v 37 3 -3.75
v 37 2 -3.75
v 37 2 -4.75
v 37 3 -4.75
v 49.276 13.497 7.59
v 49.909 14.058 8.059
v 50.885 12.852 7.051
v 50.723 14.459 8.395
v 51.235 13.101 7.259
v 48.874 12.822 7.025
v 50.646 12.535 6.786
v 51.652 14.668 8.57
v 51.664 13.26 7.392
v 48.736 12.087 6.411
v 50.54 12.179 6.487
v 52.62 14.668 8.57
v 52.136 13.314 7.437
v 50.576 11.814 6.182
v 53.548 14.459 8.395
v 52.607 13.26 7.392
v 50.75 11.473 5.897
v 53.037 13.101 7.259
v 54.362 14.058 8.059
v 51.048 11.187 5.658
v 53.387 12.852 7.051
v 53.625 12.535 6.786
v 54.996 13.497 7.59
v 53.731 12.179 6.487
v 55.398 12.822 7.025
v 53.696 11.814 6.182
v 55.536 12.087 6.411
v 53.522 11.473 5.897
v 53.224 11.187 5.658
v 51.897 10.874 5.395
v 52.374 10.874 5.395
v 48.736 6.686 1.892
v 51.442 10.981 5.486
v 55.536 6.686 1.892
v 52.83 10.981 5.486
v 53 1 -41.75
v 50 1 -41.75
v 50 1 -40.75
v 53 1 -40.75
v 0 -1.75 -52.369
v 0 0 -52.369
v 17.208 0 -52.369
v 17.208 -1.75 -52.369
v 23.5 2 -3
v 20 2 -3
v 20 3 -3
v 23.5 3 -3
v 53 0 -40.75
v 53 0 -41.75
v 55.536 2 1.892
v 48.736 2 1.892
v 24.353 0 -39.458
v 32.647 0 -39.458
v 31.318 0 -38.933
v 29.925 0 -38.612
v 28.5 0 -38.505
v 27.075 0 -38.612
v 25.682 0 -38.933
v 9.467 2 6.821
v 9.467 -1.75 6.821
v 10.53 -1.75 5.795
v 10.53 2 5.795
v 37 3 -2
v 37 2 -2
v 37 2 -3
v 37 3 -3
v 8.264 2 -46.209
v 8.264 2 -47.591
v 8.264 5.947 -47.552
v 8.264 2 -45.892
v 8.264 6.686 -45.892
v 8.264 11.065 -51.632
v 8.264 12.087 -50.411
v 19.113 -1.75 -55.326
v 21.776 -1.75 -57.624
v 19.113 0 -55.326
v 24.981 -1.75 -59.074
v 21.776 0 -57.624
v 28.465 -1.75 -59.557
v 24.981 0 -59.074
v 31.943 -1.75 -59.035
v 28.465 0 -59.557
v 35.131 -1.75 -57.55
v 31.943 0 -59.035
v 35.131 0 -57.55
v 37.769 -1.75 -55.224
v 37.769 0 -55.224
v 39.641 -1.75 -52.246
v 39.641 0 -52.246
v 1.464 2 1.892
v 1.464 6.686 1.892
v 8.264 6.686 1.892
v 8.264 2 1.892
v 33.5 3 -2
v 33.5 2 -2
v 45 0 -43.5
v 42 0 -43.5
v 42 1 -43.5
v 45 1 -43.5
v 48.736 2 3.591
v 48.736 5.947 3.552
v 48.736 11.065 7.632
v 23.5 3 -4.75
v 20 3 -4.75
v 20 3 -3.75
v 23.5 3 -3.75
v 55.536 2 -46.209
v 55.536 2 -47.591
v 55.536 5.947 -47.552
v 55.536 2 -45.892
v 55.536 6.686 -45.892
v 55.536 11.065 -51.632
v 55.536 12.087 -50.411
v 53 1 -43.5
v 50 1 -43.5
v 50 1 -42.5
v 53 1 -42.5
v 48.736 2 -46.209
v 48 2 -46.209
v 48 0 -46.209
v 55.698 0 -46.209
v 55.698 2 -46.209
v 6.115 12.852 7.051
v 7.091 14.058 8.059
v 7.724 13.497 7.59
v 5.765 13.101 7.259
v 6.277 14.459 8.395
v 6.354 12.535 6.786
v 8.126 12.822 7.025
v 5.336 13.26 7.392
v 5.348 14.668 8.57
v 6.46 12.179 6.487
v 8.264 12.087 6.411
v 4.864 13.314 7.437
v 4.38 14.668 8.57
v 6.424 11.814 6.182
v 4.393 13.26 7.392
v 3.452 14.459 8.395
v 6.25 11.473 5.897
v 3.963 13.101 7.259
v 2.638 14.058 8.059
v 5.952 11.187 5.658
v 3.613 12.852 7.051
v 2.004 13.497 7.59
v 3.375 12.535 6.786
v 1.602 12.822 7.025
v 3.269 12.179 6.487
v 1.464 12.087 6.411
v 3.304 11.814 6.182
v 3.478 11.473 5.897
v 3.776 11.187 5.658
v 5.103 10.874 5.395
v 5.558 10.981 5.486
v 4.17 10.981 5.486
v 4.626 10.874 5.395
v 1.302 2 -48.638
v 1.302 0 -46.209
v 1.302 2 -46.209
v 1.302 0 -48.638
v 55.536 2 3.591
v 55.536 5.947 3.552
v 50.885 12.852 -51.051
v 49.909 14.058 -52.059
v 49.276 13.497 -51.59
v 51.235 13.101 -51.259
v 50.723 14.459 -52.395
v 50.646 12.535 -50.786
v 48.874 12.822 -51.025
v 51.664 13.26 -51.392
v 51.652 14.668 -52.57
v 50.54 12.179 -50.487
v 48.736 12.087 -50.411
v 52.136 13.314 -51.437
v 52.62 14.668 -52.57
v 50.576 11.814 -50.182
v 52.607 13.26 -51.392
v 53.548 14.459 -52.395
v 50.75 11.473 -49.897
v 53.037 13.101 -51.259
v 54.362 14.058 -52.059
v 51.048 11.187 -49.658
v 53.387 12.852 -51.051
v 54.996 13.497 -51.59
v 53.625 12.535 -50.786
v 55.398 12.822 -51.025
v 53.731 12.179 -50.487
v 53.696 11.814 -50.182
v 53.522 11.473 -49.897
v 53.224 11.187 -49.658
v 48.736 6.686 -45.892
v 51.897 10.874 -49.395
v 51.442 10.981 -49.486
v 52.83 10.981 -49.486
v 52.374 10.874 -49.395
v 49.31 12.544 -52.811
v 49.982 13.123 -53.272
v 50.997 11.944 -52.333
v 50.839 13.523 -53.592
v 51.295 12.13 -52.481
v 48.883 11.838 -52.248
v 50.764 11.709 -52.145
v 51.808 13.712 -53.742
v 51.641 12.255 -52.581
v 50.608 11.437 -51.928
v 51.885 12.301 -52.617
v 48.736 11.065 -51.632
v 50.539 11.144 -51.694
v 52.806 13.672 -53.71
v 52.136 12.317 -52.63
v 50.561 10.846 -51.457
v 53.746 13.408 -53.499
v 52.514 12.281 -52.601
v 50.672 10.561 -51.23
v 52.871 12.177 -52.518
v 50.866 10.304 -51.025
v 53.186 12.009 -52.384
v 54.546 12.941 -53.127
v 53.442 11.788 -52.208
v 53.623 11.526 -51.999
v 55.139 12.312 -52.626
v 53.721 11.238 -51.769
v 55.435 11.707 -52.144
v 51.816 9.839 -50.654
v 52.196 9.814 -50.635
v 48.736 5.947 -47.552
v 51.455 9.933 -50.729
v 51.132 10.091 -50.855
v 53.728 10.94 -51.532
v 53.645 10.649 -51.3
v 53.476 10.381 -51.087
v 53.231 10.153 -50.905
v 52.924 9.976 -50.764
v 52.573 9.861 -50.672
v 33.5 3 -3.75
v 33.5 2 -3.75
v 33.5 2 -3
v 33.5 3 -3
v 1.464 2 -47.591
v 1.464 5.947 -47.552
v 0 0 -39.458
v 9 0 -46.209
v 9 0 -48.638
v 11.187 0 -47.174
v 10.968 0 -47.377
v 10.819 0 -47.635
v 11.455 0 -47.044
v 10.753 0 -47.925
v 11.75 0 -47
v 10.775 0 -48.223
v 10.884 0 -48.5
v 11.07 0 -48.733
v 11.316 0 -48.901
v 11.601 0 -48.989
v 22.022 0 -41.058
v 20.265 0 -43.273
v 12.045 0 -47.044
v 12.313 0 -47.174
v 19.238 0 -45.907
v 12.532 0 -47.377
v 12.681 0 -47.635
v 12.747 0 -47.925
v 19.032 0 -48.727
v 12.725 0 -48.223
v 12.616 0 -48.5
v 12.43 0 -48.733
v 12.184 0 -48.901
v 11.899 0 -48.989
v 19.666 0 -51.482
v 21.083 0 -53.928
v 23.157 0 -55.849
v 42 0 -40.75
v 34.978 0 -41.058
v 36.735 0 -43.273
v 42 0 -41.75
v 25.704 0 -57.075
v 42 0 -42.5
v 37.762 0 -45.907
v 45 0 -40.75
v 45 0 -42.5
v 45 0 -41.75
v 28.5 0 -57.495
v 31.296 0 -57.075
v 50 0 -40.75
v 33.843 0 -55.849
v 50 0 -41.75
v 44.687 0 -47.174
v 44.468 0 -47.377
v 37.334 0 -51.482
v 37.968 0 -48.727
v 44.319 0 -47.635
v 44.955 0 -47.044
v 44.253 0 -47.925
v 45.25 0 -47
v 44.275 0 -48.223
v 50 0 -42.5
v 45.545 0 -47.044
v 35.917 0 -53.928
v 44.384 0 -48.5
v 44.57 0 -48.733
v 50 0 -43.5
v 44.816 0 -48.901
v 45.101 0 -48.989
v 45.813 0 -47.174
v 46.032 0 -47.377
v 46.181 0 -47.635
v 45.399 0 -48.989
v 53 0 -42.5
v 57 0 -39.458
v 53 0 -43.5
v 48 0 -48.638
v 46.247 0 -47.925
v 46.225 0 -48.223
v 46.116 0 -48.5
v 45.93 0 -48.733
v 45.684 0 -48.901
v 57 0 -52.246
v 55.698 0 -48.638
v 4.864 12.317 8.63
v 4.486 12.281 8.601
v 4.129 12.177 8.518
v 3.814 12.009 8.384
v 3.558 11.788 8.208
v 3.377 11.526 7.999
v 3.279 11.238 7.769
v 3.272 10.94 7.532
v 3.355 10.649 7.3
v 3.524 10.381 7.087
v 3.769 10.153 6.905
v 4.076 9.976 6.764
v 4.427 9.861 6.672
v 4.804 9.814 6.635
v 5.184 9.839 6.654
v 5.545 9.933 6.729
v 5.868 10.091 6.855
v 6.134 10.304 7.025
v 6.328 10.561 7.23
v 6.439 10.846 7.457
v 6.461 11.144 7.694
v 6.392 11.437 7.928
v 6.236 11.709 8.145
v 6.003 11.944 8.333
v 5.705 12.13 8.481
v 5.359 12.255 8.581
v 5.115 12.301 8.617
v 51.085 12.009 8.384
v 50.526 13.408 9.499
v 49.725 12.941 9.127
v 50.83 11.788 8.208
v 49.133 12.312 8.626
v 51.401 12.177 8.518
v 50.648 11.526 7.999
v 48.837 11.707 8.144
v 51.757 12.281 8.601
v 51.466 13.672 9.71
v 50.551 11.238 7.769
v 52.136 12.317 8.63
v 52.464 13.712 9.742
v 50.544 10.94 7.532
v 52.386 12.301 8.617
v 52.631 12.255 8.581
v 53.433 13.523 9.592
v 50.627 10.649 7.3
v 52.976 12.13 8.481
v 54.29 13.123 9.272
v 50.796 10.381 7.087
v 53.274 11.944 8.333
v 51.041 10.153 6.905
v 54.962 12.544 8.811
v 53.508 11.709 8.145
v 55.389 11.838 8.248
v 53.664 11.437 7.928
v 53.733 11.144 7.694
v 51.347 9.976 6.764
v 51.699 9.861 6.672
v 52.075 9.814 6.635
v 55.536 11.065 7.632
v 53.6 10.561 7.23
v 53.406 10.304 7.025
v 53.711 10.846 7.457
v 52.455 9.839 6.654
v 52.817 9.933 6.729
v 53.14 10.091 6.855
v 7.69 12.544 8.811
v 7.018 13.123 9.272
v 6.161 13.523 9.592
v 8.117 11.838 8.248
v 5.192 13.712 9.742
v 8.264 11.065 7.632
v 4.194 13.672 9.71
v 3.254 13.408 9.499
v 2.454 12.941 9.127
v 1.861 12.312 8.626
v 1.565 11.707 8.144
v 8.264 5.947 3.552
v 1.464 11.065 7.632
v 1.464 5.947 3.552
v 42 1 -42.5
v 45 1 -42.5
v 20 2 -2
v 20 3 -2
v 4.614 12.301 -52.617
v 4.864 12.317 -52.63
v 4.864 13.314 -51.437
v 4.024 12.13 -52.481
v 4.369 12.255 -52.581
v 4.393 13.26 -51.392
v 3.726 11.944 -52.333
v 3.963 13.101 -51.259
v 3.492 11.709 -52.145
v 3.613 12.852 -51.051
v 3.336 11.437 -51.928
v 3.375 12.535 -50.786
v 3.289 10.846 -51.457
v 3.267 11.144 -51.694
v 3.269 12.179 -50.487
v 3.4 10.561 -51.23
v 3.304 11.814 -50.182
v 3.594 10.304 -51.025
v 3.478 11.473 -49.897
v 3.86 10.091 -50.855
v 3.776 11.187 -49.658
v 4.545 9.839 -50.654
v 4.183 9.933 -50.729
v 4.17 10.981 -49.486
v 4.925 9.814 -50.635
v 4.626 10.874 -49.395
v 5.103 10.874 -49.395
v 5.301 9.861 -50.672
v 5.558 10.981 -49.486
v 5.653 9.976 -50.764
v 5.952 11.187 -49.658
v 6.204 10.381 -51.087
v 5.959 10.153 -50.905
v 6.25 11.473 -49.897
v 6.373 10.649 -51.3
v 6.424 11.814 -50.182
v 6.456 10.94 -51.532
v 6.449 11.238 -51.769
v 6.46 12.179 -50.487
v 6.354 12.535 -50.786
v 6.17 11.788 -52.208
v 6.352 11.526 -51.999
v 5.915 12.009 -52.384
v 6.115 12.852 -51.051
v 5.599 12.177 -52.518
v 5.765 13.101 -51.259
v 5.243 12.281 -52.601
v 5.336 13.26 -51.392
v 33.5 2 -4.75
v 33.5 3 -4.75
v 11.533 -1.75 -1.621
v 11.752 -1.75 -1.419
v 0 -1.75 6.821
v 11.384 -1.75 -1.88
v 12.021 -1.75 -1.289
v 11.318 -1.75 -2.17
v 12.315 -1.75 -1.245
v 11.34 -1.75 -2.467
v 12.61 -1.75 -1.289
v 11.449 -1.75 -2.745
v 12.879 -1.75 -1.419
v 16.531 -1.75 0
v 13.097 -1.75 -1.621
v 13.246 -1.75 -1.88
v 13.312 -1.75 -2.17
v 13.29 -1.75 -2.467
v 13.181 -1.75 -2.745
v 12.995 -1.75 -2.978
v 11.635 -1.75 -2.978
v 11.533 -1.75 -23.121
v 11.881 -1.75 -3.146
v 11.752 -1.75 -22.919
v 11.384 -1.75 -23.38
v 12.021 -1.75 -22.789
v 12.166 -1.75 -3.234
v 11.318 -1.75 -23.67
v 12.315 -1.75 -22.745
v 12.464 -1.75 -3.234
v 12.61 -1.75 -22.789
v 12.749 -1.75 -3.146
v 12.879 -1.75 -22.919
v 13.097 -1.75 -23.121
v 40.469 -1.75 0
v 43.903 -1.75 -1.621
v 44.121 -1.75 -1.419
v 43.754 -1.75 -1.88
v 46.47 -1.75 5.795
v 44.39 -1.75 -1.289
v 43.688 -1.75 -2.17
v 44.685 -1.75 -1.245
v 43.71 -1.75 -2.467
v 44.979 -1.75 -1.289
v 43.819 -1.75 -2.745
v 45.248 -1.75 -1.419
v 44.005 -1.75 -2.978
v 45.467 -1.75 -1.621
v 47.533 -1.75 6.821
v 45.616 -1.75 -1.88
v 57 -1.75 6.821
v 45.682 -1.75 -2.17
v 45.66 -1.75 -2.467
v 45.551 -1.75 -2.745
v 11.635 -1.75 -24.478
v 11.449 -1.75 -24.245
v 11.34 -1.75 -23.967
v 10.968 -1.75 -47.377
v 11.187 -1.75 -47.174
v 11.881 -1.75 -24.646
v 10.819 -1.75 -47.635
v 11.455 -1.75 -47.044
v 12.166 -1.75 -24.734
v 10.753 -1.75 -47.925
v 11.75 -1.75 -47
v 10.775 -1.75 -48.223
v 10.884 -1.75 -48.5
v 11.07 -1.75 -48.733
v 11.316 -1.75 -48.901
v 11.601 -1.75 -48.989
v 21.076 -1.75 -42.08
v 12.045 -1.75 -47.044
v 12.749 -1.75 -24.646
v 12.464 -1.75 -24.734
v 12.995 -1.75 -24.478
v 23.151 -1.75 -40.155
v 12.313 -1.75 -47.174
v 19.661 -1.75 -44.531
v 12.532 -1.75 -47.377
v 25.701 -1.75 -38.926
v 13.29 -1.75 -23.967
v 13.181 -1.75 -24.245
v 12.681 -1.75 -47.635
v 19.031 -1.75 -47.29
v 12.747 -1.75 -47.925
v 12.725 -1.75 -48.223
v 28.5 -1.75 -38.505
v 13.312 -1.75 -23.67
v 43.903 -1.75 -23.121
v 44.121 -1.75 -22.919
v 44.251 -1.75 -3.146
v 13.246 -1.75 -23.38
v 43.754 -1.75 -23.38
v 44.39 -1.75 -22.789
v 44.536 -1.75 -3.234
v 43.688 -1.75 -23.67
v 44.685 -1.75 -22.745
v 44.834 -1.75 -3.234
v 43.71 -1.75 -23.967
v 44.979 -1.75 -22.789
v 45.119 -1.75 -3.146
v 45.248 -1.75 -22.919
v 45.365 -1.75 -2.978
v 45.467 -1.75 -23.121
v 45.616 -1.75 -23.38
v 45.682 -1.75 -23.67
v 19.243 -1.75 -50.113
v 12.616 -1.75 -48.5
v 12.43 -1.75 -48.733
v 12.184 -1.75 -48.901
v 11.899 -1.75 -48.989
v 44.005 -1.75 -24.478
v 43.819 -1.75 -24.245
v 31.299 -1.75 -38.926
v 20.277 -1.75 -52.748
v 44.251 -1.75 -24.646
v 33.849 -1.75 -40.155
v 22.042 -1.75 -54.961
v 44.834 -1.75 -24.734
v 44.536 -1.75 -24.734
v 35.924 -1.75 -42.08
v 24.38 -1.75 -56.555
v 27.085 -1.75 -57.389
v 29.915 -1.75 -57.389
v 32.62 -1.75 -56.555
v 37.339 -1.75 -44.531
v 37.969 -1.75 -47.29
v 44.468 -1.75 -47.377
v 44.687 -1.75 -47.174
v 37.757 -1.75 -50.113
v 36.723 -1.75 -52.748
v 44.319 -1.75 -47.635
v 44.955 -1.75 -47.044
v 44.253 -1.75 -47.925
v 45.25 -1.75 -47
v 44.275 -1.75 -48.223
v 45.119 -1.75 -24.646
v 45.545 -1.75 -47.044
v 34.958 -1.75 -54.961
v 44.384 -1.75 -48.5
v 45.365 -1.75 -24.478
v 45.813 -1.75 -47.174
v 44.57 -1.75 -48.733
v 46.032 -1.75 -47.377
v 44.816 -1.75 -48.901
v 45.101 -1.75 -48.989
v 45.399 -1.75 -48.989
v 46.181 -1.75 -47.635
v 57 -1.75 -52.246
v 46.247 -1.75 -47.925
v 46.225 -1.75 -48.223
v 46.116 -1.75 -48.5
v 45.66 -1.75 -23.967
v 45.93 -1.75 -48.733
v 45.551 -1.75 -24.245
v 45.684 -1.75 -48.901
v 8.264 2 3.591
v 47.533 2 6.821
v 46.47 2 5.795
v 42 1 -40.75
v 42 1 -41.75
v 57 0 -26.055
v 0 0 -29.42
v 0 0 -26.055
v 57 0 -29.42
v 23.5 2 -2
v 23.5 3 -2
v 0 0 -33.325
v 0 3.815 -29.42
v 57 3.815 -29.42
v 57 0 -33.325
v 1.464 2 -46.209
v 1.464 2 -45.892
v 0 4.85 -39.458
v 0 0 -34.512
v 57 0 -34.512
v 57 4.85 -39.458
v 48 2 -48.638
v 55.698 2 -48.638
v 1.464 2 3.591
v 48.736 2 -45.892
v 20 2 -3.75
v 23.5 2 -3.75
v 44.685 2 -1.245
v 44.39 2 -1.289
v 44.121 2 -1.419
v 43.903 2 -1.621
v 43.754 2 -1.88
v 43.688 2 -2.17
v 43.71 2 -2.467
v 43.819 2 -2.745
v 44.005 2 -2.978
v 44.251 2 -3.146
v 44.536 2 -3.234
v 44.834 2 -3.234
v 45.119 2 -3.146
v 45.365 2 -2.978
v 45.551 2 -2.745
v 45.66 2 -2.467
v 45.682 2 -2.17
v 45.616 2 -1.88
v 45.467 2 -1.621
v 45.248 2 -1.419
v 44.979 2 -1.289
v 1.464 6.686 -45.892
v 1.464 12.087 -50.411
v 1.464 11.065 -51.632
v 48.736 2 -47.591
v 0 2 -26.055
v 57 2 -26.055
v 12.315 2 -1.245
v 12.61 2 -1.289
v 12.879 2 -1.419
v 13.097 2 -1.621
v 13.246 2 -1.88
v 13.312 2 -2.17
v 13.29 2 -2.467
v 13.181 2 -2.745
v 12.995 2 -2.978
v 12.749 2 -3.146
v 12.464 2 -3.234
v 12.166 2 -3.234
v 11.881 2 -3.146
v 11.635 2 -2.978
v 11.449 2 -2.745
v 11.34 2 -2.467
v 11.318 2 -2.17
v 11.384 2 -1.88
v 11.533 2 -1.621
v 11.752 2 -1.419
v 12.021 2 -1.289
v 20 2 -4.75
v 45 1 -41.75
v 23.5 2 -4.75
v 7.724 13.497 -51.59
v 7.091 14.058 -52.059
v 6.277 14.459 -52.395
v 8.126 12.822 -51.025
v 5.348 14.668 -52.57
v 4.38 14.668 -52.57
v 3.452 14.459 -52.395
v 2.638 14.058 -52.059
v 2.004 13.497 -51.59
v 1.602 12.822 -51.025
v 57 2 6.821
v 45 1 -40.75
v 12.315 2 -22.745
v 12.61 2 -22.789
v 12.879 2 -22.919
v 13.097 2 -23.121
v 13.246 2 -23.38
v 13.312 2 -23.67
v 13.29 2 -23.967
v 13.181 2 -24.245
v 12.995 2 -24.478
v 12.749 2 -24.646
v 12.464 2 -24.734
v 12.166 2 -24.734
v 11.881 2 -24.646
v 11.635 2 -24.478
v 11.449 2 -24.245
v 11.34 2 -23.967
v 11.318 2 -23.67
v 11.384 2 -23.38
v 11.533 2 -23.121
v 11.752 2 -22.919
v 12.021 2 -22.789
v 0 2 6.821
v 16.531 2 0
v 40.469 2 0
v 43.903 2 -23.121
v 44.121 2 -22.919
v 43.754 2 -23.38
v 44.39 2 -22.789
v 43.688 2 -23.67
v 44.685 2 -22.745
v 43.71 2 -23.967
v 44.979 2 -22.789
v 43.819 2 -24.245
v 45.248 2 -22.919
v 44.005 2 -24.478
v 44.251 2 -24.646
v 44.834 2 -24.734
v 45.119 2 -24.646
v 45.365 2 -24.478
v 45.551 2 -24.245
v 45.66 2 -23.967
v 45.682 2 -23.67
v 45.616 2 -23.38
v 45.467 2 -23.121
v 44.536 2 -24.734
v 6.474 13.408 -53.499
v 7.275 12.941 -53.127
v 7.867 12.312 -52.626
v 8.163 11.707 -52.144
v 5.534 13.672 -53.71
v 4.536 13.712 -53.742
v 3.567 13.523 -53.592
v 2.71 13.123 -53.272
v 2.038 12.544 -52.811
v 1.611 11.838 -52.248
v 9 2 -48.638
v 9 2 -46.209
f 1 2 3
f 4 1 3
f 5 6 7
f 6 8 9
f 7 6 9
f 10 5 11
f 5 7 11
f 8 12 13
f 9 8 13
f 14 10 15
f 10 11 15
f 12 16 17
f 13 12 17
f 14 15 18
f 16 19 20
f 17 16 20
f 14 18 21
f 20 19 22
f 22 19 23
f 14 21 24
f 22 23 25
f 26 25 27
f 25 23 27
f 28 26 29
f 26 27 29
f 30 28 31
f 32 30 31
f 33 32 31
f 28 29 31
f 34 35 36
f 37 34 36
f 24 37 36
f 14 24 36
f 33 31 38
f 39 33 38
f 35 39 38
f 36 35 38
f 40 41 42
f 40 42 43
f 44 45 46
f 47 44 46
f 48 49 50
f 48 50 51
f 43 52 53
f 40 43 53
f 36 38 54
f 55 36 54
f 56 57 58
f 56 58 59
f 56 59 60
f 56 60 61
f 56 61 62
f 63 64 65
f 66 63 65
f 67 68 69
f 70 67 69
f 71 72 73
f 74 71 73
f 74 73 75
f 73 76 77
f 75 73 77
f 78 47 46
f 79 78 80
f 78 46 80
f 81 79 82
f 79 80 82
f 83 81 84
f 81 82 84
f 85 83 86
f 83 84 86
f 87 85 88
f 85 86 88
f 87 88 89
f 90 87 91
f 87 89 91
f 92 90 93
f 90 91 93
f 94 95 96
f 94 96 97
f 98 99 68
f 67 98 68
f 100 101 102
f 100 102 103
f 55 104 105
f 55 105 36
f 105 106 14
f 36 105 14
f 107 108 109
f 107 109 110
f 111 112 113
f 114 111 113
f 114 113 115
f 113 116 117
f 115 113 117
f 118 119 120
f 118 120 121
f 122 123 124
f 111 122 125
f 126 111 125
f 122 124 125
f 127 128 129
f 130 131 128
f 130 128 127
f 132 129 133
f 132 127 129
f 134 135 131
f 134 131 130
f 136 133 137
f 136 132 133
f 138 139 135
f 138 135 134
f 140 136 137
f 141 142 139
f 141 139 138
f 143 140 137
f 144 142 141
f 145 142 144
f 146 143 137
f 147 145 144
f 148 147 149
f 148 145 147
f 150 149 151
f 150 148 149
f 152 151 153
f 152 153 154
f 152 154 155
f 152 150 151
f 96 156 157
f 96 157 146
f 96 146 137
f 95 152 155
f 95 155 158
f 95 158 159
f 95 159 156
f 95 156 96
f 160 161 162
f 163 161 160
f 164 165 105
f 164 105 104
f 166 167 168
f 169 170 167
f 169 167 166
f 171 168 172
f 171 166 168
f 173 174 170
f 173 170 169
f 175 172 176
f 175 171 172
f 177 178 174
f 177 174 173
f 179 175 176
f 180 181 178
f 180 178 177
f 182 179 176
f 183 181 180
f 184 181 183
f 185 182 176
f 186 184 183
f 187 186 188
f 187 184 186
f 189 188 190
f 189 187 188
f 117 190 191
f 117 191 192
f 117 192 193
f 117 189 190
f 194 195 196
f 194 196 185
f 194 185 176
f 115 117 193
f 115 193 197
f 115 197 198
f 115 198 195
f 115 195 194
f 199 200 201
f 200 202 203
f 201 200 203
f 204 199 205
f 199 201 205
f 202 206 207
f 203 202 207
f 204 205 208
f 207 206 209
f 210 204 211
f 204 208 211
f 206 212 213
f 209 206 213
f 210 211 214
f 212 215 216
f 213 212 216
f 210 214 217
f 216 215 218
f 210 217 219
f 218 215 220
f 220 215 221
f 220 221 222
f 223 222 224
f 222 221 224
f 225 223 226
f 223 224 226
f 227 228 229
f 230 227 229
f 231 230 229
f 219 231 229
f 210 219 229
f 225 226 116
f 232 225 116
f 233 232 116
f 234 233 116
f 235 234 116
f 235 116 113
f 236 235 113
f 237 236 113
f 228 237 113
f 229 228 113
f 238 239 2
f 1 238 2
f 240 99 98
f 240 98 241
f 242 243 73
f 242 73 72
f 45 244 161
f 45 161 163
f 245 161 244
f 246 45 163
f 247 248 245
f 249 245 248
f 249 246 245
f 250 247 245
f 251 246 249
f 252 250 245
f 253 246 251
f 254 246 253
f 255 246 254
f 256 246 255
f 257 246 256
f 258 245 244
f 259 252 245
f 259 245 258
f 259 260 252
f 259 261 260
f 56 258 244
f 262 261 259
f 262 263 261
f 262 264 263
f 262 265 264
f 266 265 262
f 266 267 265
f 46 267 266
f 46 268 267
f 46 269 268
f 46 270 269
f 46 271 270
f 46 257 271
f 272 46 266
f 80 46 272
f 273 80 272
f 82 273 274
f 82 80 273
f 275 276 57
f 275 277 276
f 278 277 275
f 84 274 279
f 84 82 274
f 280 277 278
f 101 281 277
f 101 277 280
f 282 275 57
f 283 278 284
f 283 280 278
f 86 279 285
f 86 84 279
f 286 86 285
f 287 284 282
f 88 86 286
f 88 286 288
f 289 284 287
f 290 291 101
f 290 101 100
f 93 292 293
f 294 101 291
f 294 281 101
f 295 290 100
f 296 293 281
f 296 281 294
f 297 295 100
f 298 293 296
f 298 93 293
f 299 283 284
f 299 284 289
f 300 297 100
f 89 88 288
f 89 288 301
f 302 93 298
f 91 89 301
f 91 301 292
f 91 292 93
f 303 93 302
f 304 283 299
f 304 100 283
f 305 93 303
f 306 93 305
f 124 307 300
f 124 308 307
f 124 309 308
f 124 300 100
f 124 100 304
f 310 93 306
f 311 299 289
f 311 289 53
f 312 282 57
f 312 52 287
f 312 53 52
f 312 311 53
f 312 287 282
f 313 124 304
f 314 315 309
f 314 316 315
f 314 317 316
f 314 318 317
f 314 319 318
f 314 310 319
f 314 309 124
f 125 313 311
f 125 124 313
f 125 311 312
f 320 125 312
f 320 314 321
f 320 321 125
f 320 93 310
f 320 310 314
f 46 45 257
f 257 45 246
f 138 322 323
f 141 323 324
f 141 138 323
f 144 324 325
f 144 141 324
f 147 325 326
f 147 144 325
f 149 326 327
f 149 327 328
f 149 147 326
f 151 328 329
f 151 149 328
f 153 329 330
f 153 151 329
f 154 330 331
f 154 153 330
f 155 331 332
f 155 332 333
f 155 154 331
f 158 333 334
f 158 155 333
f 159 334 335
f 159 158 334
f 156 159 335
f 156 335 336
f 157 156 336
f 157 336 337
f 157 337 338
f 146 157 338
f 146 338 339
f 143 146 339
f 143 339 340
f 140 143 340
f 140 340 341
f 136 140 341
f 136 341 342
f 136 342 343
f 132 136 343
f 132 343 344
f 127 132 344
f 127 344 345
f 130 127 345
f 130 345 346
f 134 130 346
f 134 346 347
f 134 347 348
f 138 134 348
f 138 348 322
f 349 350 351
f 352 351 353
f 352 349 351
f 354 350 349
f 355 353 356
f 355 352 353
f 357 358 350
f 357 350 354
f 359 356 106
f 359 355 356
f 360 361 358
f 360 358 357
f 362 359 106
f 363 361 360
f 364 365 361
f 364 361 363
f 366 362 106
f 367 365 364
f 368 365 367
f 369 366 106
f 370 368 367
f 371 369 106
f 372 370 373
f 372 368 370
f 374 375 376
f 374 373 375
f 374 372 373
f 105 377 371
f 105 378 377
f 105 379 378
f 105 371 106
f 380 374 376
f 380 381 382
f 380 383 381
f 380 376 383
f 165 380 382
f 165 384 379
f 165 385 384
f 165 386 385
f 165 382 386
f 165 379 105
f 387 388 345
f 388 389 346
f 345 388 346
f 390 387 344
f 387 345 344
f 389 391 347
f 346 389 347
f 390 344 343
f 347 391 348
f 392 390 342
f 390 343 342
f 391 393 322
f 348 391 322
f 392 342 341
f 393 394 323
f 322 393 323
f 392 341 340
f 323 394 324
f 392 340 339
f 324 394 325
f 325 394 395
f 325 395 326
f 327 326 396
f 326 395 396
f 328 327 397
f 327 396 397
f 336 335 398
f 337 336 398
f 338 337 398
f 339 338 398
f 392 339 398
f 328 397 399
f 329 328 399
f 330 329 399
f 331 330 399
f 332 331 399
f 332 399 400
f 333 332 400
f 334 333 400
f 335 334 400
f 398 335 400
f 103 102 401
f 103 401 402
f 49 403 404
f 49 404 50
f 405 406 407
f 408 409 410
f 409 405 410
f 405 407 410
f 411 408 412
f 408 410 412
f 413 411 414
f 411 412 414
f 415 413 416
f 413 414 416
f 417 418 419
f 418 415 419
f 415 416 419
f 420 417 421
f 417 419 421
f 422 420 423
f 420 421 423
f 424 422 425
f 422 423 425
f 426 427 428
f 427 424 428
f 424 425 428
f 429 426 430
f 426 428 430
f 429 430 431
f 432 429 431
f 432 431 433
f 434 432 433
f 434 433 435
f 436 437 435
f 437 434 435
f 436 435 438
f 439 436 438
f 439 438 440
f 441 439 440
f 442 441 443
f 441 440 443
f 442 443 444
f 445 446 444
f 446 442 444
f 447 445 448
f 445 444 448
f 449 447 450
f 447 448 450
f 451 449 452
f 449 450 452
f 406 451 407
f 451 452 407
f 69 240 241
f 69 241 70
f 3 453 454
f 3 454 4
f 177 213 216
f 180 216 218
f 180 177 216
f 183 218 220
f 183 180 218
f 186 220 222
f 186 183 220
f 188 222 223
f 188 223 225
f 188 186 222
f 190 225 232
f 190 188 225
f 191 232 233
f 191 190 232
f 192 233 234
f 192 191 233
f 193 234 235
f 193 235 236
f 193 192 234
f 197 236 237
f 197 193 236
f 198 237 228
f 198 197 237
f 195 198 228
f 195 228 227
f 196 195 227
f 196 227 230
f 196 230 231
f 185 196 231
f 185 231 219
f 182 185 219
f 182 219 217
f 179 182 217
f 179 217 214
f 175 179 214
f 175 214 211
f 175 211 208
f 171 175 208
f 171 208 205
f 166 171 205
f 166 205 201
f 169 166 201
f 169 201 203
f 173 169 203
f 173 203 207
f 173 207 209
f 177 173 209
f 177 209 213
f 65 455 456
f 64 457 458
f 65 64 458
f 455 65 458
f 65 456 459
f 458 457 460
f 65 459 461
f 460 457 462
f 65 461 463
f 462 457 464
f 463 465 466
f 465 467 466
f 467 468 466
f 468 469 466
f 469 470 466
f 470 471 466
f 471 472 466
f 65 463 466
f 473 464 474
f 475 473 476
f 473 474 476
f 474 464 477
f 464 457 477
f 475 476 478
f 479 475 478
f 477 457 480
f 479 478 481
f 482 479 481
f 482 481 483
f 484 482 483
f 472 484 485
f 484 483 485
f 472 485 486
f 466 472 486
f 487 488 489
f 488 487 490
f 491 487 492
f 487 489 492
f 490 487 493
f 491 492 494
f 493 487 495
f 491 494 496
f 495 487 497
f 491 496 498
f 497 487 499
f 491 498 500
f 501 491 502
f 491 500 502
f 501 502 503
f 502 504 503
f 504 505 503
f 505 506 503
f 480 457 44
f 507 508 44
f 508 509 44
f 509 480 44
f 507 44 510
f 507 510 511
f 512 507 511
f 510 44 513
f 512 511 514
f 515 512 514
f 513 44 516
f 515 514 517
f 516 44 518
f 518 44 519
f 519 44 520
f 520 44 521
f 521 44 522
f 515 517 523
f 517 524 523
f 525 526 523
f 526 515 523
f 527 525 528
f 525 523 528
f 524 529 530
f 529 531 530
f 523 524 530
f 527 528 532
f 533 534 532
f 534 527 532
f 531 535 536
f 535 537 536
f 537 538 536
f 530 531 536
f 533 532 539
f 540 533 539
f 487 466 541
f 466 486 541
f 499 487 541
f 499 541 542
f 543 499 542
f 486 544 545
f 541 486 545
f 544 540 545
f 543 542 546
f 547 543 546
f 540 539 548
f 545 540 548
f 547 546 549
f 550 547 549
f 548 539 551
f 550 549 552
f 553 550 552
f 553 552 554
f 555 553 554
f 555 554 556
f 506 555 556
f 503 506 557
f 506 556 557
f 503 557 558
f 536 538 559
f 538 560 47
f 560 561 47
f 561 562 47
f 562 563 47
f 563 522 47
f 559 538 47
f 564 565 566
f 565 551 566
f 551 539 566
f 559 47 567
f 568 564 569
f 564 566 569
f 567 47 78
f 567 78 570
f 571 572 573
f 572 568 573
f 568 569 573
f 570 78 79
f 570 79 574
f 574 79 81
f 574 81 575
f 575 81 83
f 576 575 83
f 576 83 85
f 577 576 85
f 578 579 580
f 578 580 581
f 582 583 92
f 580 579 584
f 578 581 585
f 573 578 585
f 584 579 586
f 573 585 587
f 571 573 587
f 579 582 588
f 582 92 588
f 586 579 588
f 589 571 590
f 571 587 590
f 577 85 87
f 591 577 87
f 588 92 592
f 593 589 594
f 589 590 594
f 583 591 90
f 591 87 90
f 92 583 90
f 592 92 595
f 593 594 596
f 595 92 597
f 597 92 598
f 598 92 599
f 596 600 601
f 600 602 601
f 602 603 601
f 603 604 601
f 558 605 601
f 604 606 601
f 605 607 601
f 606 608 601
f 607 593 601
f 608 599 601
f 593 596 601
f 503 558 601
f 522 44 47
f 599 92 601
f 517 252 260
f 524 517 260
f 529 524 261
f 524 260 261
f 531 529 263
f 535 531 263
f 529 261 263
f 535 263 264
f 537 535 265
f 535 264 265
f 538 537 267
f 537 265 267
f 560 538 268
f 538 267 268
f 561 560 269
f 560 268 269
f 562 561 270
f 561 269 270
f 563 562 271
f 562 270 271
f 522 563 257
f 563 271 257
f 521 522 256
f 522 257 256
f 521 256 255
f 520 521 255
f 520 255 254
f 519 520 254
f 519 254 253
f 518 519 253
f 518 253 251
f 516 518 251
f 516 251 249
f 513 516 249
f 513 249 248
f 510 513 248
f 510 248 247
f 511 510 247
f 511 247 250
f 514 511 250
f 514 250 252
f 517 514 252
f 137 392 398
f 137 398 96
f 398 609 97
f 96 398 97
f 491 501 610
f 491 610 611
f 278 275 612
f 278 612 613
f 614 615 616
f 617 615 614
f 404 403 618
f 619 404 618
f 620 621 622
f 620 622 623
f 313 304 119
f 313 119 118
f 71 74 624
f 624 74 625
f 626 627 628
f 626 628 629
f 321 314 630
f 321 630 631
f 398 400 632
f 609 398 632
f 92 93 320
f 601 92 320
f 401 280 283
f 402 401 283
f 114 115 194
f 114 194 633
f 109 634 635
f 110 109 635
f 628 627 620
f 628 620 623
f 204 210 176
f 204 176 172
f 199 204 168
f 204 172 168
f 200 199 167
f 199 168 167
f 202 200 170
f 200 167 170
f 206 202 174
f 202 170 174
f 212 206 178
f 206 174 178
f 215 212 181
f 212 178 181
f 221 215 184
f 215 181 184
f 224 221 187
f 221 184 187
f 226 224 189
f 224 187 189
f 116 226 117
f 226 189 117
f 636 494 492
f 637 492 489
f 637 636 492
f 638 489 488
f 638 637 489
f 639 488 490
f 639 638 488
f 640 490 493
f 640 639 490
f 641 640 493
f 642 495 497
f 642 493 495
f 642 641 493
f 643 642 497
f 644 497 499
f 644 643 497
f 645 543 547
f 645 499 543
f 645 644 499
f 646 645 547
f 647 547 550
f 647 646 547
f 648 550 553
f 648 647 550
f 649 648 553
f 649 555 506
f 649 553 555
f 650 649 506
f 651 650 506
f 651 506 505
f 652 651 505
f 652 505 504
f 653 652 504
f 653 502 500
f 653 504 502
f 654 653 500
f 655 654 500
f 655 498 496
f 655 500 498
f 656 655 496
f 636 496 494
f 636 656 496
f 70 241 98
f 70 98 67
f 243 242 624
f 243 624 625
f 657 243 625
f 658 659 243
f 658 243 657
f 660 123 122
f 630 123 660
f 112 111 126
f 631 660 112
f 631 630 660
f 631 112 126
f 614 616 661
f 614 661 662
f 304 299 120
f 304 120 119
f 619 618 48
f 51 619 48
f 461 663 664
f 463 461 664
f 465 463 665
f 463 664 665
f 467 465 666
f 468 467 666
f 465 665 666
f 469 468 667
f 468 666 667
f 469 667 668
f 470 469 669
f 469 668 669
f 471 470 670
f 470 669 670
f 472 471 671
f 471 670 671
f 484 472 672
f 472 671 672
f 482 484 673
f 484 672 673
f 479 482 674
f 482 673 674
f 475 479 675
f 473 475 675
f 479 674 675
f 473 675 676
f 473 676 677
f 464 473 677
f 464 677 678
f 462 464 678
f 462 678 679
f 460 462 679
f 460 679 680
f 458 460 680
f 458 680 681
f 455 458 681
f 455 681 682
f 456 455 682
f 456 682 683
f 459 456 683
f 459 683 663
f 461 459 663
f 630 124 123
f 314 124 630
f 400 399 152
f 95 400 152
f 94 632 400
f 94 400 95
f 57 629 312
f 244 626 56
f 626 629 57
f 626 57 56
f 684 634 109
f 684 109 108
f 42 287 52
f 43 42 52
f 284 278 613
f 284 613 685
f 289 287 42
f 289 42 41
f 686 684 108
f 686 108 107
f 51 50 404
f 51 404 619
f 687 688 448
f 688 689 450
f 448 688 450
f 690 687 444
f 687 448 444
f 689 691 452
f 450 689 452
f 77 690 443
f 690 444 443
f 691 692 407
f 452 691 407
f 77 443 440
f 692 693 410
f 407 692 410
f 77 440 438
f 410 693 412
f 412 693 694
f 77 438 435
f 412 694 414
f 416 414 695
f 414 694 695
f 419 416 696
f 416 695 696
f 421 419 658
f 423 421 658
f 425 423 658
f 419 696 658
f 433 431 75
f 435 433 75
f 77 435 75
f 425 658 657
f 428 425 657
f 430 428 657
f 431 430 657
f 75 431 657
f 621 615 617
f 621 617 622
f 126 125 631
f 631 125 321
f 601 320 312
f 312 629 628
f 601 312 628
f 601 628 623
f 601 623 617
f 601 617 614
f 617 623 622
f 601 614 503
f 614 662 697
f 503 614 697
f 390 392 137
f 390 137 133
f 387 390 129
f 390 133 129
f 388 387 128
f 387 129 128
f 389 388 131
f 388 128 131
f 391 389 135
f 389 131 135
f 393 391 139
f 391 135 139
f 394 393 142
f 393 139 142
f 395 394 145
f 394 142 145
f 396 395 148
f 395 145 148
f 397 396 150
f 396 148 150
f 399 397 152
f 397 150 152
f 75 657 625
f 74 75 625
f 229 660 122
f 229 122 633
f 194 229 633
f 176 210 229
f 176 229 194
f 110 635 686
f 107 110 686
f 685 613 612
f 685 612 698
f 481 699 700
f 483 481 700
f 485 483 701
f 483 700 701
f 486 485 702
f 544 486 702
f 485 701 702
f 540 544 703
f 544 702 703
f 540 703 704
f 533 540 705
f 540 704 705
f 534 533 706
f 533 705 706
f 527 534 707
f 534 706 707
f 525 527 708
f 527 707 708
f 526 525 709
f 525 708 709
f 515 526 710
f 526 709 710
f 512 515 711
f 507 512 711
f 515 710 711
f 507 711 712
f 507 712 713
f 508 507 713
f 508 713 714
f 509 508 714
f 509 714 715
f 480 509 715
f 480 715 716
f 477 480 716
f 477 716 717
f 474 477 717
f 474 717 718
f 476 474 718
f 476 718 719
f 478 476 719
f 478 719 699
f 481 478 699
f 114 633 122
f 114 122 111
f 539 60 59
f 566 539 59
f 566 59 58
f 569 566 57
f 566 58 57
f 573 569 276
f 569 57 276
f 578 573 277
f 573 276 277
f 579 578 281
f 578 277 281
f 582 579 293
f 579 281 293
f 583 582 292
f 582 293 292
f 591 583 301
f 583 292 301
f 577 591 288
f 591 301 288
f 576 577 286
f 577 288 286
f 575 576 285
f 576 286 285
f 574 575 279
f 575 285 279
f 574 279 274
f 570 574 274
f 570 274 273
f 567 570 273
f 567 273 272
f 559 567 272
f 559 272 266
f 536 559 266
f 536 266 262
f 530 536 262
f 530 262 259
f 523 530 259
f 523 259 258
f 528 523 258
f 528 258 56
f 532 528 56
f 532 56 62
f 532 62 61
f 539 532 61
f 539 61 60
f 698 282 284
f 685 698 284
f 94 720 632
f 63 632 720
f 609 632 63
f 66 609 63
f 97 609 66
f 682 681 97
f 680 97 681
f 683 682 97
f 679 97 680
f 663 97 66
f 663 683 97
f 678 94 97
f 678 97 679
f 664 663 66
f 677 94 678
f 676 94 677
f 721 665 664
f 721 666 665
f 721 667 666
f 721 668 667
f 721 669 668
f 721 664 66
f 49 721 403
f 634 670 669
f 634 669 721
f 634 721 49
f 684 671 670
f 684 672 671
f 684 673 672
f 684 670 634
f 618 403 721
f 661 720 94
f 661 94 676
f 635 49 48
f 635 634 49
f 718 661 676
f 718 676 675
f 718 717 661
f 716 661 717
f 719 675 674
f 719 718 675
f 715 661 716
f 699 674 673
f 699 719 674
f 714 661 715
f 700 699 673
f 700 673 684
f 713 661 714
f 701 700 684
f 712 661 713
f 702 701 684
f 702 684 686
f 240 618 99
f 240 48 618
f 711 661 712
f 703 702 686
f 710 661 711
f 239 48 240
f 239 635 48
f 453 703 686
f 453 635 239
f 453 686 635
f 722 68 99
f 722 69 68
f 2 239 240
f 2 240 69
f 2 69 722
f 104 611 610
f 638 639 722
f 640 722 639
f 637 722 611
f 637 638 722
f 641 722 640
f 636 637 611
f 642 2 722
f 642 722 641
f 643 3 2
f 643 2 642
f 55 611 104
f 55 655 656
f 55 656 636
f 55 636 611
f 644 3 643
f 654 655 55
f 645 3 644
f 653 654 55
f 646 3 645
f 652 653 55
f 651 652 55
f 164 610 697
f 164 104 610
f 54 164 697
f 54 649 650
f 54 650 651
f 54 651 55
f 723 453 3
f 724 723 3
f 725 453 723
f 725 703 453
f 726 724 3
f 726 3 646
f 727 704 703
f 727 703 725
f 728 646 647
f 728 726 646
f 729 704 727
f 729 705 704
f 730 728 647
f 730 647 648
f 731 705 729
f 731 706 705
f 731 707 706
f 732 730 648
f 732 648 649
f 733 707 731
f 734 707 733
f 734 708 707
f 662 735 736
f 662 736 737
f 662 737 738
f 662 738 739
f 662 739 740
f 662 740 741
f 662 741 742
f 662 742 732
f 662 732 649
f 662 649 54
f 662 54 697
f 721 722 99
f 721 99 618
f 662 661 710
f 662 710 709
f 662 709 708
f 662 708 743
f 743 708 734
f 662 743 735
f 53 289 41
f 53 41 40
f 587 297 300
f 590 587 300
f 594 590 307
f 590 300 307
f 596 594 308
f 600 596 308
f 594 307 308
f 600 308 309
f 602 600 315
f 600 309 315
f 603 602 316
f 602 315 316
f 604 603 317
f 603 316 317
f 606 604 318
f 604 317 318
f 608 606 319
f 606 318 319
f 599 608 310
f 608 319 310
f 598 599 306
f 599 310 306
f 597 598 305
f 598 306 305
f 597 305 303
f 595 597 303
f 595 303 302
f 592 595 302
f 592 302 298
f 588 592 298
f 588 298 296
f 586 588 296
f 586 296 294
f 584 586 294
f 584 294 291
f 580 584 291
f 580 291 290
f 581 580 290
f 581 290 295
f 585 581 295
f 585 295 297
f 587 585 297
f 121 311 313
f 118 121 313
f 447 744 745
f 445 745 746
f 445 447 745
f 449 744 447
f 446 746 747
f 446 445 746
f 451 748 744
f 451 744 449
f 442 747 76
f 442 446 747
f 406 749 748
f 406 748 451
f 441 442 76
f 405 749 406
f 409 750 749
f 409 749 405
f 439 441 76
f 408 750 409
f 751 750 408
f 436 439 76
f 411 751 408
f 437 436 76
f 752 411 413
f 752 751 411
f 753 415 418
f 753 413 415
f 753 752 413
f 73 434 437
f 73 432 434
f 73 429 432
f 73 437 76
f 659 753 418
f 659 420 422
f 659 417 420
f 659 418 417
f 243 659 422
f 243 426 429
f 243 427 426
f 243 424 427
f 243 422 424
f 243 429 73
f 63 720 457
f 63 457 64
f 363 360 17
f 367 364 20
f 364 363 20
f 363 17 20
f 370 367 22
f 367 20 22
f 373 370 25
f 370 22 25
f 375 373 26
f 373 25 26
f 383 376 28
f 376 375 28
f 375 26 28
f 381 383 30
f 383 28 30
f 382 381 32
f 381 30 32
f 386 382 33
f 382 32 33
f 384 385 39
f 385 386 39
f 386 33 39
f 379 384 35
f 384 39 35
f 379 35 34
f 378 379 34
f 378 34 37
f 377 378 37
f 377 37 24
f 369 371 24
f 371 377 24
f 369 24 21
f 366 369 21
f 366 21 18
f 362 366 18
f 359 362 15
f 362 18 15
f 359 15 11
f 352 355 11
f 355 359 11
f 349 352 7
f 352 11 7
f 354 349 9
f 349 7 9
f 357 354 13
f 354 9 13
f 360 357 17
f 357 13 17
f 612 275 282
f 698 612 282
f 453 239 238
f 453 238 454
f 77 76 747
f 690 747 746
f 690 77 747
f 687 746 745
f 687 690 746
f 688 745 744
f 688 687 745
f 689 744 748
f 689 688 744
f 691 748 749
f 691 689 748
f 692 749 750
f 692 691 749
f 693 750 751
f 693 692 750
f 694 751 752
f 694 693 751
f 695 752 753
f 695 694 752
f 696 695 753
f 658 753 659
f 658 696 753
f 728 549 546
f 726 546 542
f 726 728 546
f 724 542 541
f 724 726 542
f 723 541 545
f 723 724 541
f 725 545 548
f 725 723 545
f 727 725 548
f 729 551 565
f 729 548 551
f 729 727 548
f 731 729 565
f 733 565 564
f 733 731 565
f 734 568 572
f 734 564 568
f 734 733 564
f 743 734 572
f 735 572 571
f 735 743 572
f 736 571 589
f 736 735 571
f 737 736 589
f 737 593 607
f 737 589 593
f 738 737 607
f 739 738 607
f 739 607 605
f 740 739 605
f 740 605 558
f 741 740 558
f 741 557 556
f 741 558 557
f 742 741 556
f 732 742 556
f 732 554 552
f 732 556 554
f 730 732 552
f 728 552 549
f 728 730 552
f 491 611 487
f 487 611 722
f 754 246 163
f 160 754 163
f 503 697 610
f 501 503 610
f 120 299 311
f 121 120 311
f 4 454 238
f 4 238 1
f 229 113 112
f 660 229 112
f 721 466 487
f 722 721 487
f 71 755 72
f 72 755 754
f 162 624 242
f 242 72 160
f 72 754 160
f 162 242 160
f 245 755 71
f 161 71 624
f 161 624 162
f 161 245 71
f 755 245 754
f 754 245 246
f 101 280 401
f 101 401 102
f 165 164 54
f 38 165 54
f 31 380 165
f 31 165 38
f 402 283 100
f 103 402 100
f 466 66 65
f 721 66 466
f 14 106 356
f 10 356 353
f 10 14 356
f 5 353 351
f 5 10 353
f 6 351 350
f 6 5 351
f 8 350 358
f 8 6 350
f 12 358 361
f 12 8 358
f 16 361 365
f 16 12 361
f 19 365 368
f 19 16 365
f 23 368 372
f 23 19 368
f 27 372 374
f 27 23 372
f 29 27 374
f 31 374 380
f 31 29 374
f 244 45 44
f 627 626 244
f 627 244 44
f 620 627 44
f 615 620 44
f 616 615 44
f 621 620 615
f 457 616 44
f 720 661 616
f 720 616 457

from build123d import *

# Parameters (mm, degrees)
SKIZZE1_W                        = 57
SKIZZE1_H                        = 60
AUFSATZ_LINEAR_AUSTRAGEN1_DEPTH  = 1.75
SKIZZE3_R                        = 9.495370676
SCHNITT_LINEAR_AUSTRAGEN1_DEPTH  = 2
SKIZZE4_W                        = 57
SKIZZE4_H                        = 26.054547174
AUFSATZ_LINEAR_AUSTRAGEN2_DEPTH  = 2
SKIZZE5_R                        = 1
SCHNITT_LINEAR_AUSTRAGEN2_DEPTH  = 4
AUFSATZ_LINEAR_AUSTRAGEN3_DEPTH  = 57
SKIZZE10_R                       = 1
SCHNITT_LINEAR_AUSTRAGEN3_DEPTH  = 2
AUFSATZ_LINEAR_AUSTRAGEN4_DEPTH  = 57
SKIZZE13_W                       = 3
SKIZZE13_H                       = 1
AUFSATZ_LINEAR_AUSTRAGEN6_DEPTH  = 1
SKIZZE16_W                       = 3.5
SKIZZE16_H                       = 1
AUFSATZ_LINEAR_AUSTRAGEN9_DEPTH  = 1
AUFSATZ_LINEAR_AUSTRAGEN11_DEPTH = 3.75
SKIZZE25_W                       = 6.8
SKIZZE25_H                       = 4.678014598
AUFSATZ_LINEAR_AUSTRAGEN12_DEPTH = 13
SKIZZE26_W                       = 6.272143652
SKIZZE26_H                       = 7.131924913
AUFSATZ_LINEAR_AUSTRAGEN13_DEPTH = 6.8
SCHNITT_LINEAR_AUSTRAGEN5_DEPTH  = 6.8
SCHNITT_LINEAR_AUSTRAGEN6_DEPTH  = 6.8
SCHNITT_LINEAR_AUSTRAGEN8_DEPTH  = 3.8
SKIZZE30_R                       = 1.6
SCHNITT_LINEAR_AUSTRAGEN9_DEPTH  = 3.8
SKIZZE31_W                       = 7.69751232
SKIZZE31_H                       = 2.429513609
AUFSATZ_LINEAR_AUSTRAGEN15_DEPTH = 2
SPIEGELN9_COPY_1_SKETCH_W        = 6.8
SPIEGELN9_COPY_1_SKETCH_H        = 4.678014598
SPIEGELN9_COPY_1_DEPTH           = 13
SPIEGELN9_COPY_2_SKETCH_W        = 6.272143652
SPIEGELN9_COPY_2_SKETCH_H        = 7.131924913
SPIEGELN9_COPY_2_DEPTH           = 6.8
SPIEGELN9_COPY_3_DEPTH           = 6.8
SPIEGELN9_COPY_4_DEPTH           = 6.8
SPIEGELN9_COPY_5_DEPTH           = 3.8
SPIEGELN9_COPY_6_SKETCH_R        = 1.6
SPIEGELN9_COPY_6_DEPTH           = 3.8
SCHNITT_LINEAR_AUSTRAGEN10_DEPTH = 10
SCHNITT_LINEAR_AUSTRAGEN11_DEPTH = 10


with BuildPart() as part:
    # Skizze1 → Aufsatz-Linear austragen1 (new body)
    with BuildSketch(Plane(origin=(0, 0, 0), x_dir=(1, 0, 0), z_dir=(0, 1, 0))):
        with Locations((28.5, 30)):
            Rectangle(SKIZZE1_W, SKIZZE1_H)
    extrude(amount=-AUFSATZ_LINEAR_AUSTRAGEN1_DEPTH)

    # Skizze3 → Schnitt-Linear austragen1 (cut)
    with BuildSketch(Plane(origin=(0, 0, 0), x_dir=(1, 0, 0), z_dir=(0, 1, 0))):
        with Locations(Location((28.5, 48, 0), (0, 0, 270))):
            Circle(SKIZZE3_R)
    extrude(amount=-SCHNITT_LINEAR_AUSTRAGEN1_DEPTH, mode=Mode.SUBTRACT)

    # Skizze4 → Aufsatz-Linear austragen2 (add)
    with BuildSketch(Plane(origin=(0, 0, 0), x_dir=(1, 0, 0), z_dir=(0, 1, 0))):
        with Locations((28.5, 13.027273587)):
            Rectangle(SKIZZE4_W, SKIZZE4_H)
    extrude(amount=AUFSATZ_LINEAR_AUSTRAGEN2_DEPTH)

    # Skizze5 → Schnitt-Linear austragen2 (cut)
    with BuildSketch(Plane(origin=(0, 2, 0), x_dir=(1, 0, 0), z_dir=(0, 1, 0))):
        with Locations(Location((12.315263515, 23.744868689, 0), (0, 0, 270))):
            Circle(SKIZZE5_R)
        with Locations(Location((12.315263515, 2.244868689, 0), (0, 0, 270))):
            Circle(SKIZZE5_R)
    schnitt_linear_austragen2 = extrude(amount=-SCHNITT_LINEAR_AUSTRAGEN2_DEPTH, mode=Mode.SUBTRACT)

    # Spiegeln1: Schnitt-Linear austragen2 across plane
    add(schnitt_linear_austragen2.mirror(Plane.ZY.offset(-28.5)), mode=Mode.SUBTRACT)

    # Skizze8 → Aufsatz-Linear austragen3 (add)
    with BuildSketch(Plane.ZY):
        Polygon((-29.419890543, 3.815337259), (-33.325270164, 0), (-29.419890543, 0), align=None)
    extrude(amount=-AUFSATZ_LINEAR_AUSTRAGEN3_DEPTH)

    # Skizze10 → Schnitt-Linear austragen3 (cut)
    with BuildSketch(Plane(origin=(0, 0, 0), x_dir=(1, 0, 0), z_dir=(0, 1, 0))):
        with Locations(Location((45.25, 48, 0), (0, 0, 270))):
            Circle(SKIZZE10_R)
        with Locations(Location((11.75, 48, 0), (0, 0, 270))):
            Circle(SKIZZE10_R)
    extrude(amount=-SCHNITT_LINEAR_AUSTRAGEN3_DEPTH, mode=Mode.SUBTRACT)

    # Skizze11 → Aufsatz-Linear austragen4 (add)
    with BuildSketch(Plane.ZY):
        Polygon((-39.458282478, 4.85029471), (-39.458282478, 0), (-34.51169532, 0), align=None)
    extrude(amount=-AUFSATZ_LINEAR_AUSTRAGEN4_DEPTH)

    # Skizze13 → Aufsatz-Linear austragen6 (add)
    with BuildSketch(Plane(origin=(0, 0, 0), x_dir=(1, 0, 0), z_dir=(0, 1, 0))):
        with Locations((51.5, 43)):
            Rectangle(SKIZZE13_W, SKIZZE13_H)
        with Locations((43.5, 43)):
            Rectangle(SKIZZE13_W, SKIZZE13_H)
        with Locations((51.5, 41.25)):
            Rectangle(SKIZZE13_W, SKIZZE13_H)
        with Locations((43.5, 41.25)):
            Rectangle(SKIZZE13_W, SKIZZE13_H)
    extrude(amount=AUFSATZ_LINEAR_AUSTRAGEN6_DEPTH)

    # Skizze16 → Aufsatz-Linear austragen9 (add)
    with BuildSketch(Plane(origin=(0, 2, 0), x_dir=(1, 0, 0), z_dir=(0, 1, 0))):
        with Locations((21.75, 2.5)):
            Rectangle(SKIZZE16_W, SKIZZE16_H)
        with Locations((35.25, 2.5)):
            Rectangle(SKIZZE16_W, SKIZZE16_H)
        with Locations((21.75, 4.25)):
            Rectangle(SKIZZE16_W, SKIZZE16_H)
        with Locations((35.25, 4.25)):
            Rectangle(SKIZZE16_W, SKIZZE16_H)
    extrude(amount=AUFSATZ_LINEAR_AUSTRAGEN9_DEPTH)

    # Skizze24 → Aufsatz-Linear austragen11 (add)
    with BuildSketch(Plane(origin=(0, 2, 0), x_dir=(1, 0, 0), z_dir=(0, 1, 0))):
        Polygon((57, 0), (57, -15.963189927), (46.470395694, -5.79521838), (40.469065327, 0), align=None)
    aufsatz_linear_austragen11 = extrude(amount=-AUFSATZ_LINEAR_AUSTRAGEN11_DEPTH)

    # Spiegeln2: Aufsatz-Linear austragen11 across plane
    add(aufsatz_linear_austragen11.mirror(Plane.ZY.offset(-28.5)))

    # Skizze25 → Aufsatz-Linear austragen12 (add)
    with BuildSketch(Plane(origin=(0, 2, 0), x_dir=(1, 0, 0), z_dir=(0, 1, 0))):
        with Locations((52.135864274, -3.62433538)):
            Rectangle(SKIZZE25_W, SKIZZE25_H)
    aufsatz_linear_austragen12 = extrude(amount=AUFSATZ_LINEAR_AUSTRAGEN12_DEPTH)

    # Skizze26 → Aufsatz-Linear austragen13 (add)
    with BuildSketch(Plane(origin=(55.535864274, 0, 0), x_dir=(0, 0, -1), z_dir=(1, 0, 0))):
        with Locations((-9.099414505, 11.434037544)):
            Rectangle(SKIZZE26_W, SKIZZE26_H)
    aufsatz_linear_austragen13 = extrude(amount=-AUFSATZ_LINEAR_AUSTRAGEN13_DEPTH)

    # Skizze27 → Schnitt-Linear austragen5 (cut)
    with BuildSketch(Plane(origin=(55.535864274, 0, 0), x_dir=(0, 0, -1), z_dir=(1, 0, 0))):
        Polygon((-10.768511785, 15), (-3.552210741, 5.947030188), (-3.590728104, 2), (-6.081048451, 2), (-5.963342679, 7.868075087), (-12.235486331, 7.868075087), (-12.235486331, 15), align=None)
    schnitt_linear_austragen5 = extrude(amount=-SCHNITT_LINEAR_AUSTRAGEN5_DEPTH, mode=Mode.SUBTRACT)

    # Skizze28 → Schnitt-Linear austragen6 (cut)
    with BuildSketch(Plane(origin=(55.535864274, 0, 0), x_dir=(0, 0, -1), z_dir=(1, 0, 0))):
        Polygon((-9.855196272, 13.854230483), (-8.675818052, 14.794336156), (-1.891775147, 6.686320141), (-1.891775147, 2), (-1.241465065, 2), (-1.241465065, 15.430103774), (-11.112831421, 15.430103774), align=None)
    schnitt_linear_austragen6 = extrude(amount=-SCHNITT_LINEAR_AUSTRAGEN6_DEPTH, mode=Mode.SUBTRACT)

    # Skizze29 → Schnitt-Linear austragen8 (cut)
    with BuildSketch(Plane(origin=(0, 1.822324688, -2.177969385), x_dir=(-1, 0, 0), z_dir=(0, 0.6417106486161895, -0.7669468322201934))):
        with BuildLine():
            Line((-55.535864274, 13.383825147), (-55.535864274, 17.083825147))
            Line((-55.535864274, 17.083825147), (-48.735864274, 17.083825147))
            Line((-48.735864274, 17.083825147), (-48.735864274, 13.383825147))
            ThreePointArc((-48.735864274, 13.383825147), (-52.135864274, 16.783825147), (-55.535864274, 13.383825147))
        make_face()
    schnitt_linear_austragen8 = extrude(amount=-SCHNITT_LINEAR_AUSTRAGEN8_DEPTH, mode=Mode.SUBTRACT)

    # Skizze30 → Schnitt-Linear austragen9 (cut)
    with BuildSketch(Plane(origin=(0, 1.822324688, -2.177969385), x_dir=(-1, 0, 0), z_dir=(0, 0.6417106486161896, -0.7669468322201933))):
        with Locations(Location((-52.135864274, 13.383825147, 0), (0, 0, 90))):
            Circle(SKIZZE30_R)
    schnitt_linear_austragen9 = extrude(amount=-SCHNITT_LINEAR_AUSTRAGEN9_DEPTH, mode=Mode.SUBTRACT)

    # Spiegeln6: Aufsatz-Linear austragen12, Aufsatz-Linear austragen13, Schnitt-Linear austragen5, Schnitt-Linear austragen6, Schnitt-Linear austragen8, Schnitt-Linear austragen9 across plane
    add(aufsatz_linear_austragen12.mirror(Plane.ZY.offset(-28.5)))
    add(aufsatz_linear_austragen13.mirror(Plane.ZY.offset(-28.5)))
    add(schnitt_linear_austragen5.mirror(Plane.ZY.offset(-28.5)), mode=Mode.SUBTRACT)
    add(schnitt_linear_austragen6.mirror(Plane.ZY.offset(-28.5)), mode=Mode.SUBTRACT)
    add(schnitt_linear_austragen8.mirror(Plane.ZY.offset(-28.5)), mode=Mode.SUBTRACT)
    add(schnitt_linear_austragen9.mirror(Plane.ZY.offset(-28.5)), mode=Mode.SUBTRACT)

    # Skizze31 → Aufsatz-Linear austragen15 (add)
    with BuildSketch(Plane(origin=(0, 0, 0), x_dir=(1, 0, 0), z_dir=(0, 1, 0))):
        with Locations((51.84875616, 47.423389314)):
            Rectangle(SKIZZE31_W, SKIZZE31_H)
    aufsatz_linear_austragen15 = extrude(amount=AUFSATZ_LINEAR_AUSTRAGEN15_DEPTH)

    # Spiegeln8: Aufsatz-Linear austragen12, Aufsatz-Linear austragen13, Schnitt-Linear austragen5, Schnitt-Linear austragen6, Schnitt-Linear austragen8, Schnitt-Linear austragen9 across plane
    add(aufsatz_linear_austragen12.mirror(Plane(origin=(0, 0, -22), x_dir=(1, 0, 0), z_dir=(0, 0, -1))))
    add(aufsatz_linear_austragen13.mirror(Plane(origin=(0, 0, -22), x_dir=(1, 0, 0), z_dir=(0, 0, -1))))
    add(schnitt_linear_austragen5.mirror(Plane(origin=(0, 0, -22), x_dir=(1, 0, 0), z_dir=(0, 0, -1))), mode=Mode.SUBTRACT)
    add(schnitt_linear_austragen6.mirror(Plane(origin=(0, 0, -22), x_dir=(1, 0, 0), z_dir=(0, 0, -1))), mode=Mode.SUBTRACT)
    add(schnitt_linear_austragen8.mirror(Plane(origin=(0, 0, -22), x_dir=(1, 0, 0), z_dir=(0, 0, -1))), mode=Mode.SUBTRACT)
    add(schnitt_linear_austragen9.mirror(Plane(origin=(0, 0, -22), x_dir=(1, 0, 0), z_dir=(0, 0, -1))), mode=Mode.SUBTRACT)

    # Spiegeln9: Aufsatz-Linear austragen12, Schnitt-Linear austragen5, Schnitt-Linear austragen6, Schnitt-Linear austragen8, Schnitt-Linear austragen9, Aufsatz-Linear austragen15 across plane
    add(aufsatz_linear_austragen12.mirror(Plane.ZY.offset(-28.5)))
    add(schnitt_linear_austragen5.mirror(Plane.ZY.offset(-28.5)), mode=Mode.SUBTRACT)
    add(schnitt_linear_austragen6.mirror(Plane.ZY.offset(-28.5)), mode=Mode.SUBTRACT)
    add(schnitt_linear_austragen8.mirror(Plane.ZY.offset(-28.5)), mode=Mode.SUBTRACT)
    add(schnitt_linear_austragen9.mirror(Plane.ZY.offset(-28.5)), mode=Mode.SUBTRACT)
    add(aufsatz_linear_austragen15.mirror(Plane.ZY.offset(-28.5)))

    # Spiegeln9 copy 1 sketch → Spiegeln9 copy 1 (add)
    with BuildSketch(Plane(origin=(57, 2, -44), x_dir=(-1, 0, 0), z_dir=(0, 1, 0))):
        with Locations((52.135864274, -3.62433538)):
            Rectangle(SPIEGELN9_COPY_1_SKETCH_W, SPIEGELN9_COPY_1_SKETCH_H)
    extrude(amount=SPIEGELN9_COPY_1_DEPTH)

    # Spiegeln9 copy 2 sketch → Spiegeln9 copy 2 (add)
    with BuildSketch(Plane(origin=(1.464135726, 0, -44), x_dir=(0, 0, 1), z_dir=(-1, 0, 0))):
        with Locations((-9.099414505, 11.434037544)):
            Rectangle(SPIEGELN9_COPY_2_SKETCH_W, SPIEGELN9_COPY_2_SKETCH_H)
    extrude(amount=-SPIEGELN9_COPY_2_DEPTH)

    # Spiegeln9 copy 3 sketch → Spiegeln9 copy 3 (cut)
    with BuildSketch(Plane(origin=(1.464135726, 0, -44), x_dir=(0, 0, 1), z_dir=(-1, 0, 0))):
        Polygon((-10.768511785, 15), (-3.552210741, 5.947030188), (-3.590728104, 2), (-6.081048451, 2), (-5.963342679, 7.868075087), (-12.235486331, 7.868075087), (-12.235486331, 15), align=None)
    extrude(amount=-SPIEGELN9_COPY_3_DEPTH, mode=Mode.SUBTRACT)

    # Spiegeln9 copy 4 sketch → Spiegeln9 copy 4 (cut)
    with BuildSketch(Plane(origin=(1.464135726, 0, -44), x_dir=(0, 0, 1), z_dir=(-1, 0, 0))):
        Polygon((-9.855196272, 13.854230483), (-8.675818052, 14.794336156), (-1.891775147, 6.686320141), (-1.891775147, 2), (-1.241465065, 2), (-1.241465065, 15.430103774), (-11.112831421, 15.430103774), align=None)
    extrude(amount=-SPIEGELN9_COPY_4_DEPTH, mode=Mode.SUBTRACT)

    # Spiegeln9 copy 5 sketch → Spiegeln9 copy 5 (cut)
    with BuildSketch(Plane(origin=(57, 1.822324688, -41.822030615), x_dir=(1, 0, 0), z_dir=(0, 0.6417106486161895, 0.7669468322201934))):
        with BuildLine():
            Line((-55.535864274, 13.383825147), (-55.535864274, 17.083825147))
            Line((-55.535864274, 17.083825147), (-48.735864274, 17.083825147))
            Line((-48.735864274, 17.083825147), (-48.735864274, 13.383825147))
            ThreePointArc((-48.735864274, 13.383825147), (-52.135864274, 16.783825147), (-55.535864274, 13.383825147))
        make_face()
    extrude(amount=-SPIEGELN9_COPY_5_DEPTH, mode=Mode.SUBTRACT)

    # Spiegeln9 copy 6 sketch → Spiegeln9 copy 6 (cut)
    with BuildSketch(Plane(origin=(57, 1.822324688, -41.822030615), x_dir=(1, 0, 0), z_dir=(0, 0.6417106486161896, 0.7669468322201933))):
        with Locations(Location((-52.135864274, 13.383825147, 0), (0, 0, 90))):
            Circle(SPIEGELN9_COPY_6_SKETCH_R)
    extrude(amount=-SPIEGELN9_COPY_6_DEPTH, mode=Mode.SUBTRACT)

    # Skizze36 → Schnitt-Linear austragen10 (cut)
    with BuildSketch(Plane(origin=(0, 0, 0), x_dir=(1, 0, 0), z_dir=(0, 1, 0))):
        with BuildLine():
            Line((0, 52.369033875), (17.208372804, 52.369033875))
            ThreePointArc((17.208372804, 52.369033875), (28.464546382, 59.557465407), (39.640881486, 52.2455214))
            Line((39.640881486, 52.2455214), (57, 52.2455214))
            Line((57, 52.2455214), (57, 60))
            Line((57, 60), (0, 60))
            Line((0, 60), (0, 52.369033875))
        make_face()
    extrude(amount=-SCHNITT_LINEAR_AUSTRAGEN10_DEPTH, mode=Mode.SUBTRACT)

    # Skizze37 → Schnitt-Linear austragen11 (cut)
    with BuildSketch(Plane(origin=(0, 2, 0), x_dir=(1, 0, 0), z_dir=(0, 1, 0))):
        Polygon((0, -6.821439936), (9.576067719, -6.821439936), (0, -15.963189927), align=None)
    schnitt_linear_austragen11 = extrude(amount=-SCHNITT_LINEAR_AUSTRAGEN11_DEPTH, mode=Mode.SUBTRACT)

    # Spiegeln10: Schnitt-Linear austragen11 across plane
    add(schnitt_linear_austragen11.mirror(Plane.ZY.offset(-28.5)), mode=Mode.SUBTRACT)


solid = part.part
